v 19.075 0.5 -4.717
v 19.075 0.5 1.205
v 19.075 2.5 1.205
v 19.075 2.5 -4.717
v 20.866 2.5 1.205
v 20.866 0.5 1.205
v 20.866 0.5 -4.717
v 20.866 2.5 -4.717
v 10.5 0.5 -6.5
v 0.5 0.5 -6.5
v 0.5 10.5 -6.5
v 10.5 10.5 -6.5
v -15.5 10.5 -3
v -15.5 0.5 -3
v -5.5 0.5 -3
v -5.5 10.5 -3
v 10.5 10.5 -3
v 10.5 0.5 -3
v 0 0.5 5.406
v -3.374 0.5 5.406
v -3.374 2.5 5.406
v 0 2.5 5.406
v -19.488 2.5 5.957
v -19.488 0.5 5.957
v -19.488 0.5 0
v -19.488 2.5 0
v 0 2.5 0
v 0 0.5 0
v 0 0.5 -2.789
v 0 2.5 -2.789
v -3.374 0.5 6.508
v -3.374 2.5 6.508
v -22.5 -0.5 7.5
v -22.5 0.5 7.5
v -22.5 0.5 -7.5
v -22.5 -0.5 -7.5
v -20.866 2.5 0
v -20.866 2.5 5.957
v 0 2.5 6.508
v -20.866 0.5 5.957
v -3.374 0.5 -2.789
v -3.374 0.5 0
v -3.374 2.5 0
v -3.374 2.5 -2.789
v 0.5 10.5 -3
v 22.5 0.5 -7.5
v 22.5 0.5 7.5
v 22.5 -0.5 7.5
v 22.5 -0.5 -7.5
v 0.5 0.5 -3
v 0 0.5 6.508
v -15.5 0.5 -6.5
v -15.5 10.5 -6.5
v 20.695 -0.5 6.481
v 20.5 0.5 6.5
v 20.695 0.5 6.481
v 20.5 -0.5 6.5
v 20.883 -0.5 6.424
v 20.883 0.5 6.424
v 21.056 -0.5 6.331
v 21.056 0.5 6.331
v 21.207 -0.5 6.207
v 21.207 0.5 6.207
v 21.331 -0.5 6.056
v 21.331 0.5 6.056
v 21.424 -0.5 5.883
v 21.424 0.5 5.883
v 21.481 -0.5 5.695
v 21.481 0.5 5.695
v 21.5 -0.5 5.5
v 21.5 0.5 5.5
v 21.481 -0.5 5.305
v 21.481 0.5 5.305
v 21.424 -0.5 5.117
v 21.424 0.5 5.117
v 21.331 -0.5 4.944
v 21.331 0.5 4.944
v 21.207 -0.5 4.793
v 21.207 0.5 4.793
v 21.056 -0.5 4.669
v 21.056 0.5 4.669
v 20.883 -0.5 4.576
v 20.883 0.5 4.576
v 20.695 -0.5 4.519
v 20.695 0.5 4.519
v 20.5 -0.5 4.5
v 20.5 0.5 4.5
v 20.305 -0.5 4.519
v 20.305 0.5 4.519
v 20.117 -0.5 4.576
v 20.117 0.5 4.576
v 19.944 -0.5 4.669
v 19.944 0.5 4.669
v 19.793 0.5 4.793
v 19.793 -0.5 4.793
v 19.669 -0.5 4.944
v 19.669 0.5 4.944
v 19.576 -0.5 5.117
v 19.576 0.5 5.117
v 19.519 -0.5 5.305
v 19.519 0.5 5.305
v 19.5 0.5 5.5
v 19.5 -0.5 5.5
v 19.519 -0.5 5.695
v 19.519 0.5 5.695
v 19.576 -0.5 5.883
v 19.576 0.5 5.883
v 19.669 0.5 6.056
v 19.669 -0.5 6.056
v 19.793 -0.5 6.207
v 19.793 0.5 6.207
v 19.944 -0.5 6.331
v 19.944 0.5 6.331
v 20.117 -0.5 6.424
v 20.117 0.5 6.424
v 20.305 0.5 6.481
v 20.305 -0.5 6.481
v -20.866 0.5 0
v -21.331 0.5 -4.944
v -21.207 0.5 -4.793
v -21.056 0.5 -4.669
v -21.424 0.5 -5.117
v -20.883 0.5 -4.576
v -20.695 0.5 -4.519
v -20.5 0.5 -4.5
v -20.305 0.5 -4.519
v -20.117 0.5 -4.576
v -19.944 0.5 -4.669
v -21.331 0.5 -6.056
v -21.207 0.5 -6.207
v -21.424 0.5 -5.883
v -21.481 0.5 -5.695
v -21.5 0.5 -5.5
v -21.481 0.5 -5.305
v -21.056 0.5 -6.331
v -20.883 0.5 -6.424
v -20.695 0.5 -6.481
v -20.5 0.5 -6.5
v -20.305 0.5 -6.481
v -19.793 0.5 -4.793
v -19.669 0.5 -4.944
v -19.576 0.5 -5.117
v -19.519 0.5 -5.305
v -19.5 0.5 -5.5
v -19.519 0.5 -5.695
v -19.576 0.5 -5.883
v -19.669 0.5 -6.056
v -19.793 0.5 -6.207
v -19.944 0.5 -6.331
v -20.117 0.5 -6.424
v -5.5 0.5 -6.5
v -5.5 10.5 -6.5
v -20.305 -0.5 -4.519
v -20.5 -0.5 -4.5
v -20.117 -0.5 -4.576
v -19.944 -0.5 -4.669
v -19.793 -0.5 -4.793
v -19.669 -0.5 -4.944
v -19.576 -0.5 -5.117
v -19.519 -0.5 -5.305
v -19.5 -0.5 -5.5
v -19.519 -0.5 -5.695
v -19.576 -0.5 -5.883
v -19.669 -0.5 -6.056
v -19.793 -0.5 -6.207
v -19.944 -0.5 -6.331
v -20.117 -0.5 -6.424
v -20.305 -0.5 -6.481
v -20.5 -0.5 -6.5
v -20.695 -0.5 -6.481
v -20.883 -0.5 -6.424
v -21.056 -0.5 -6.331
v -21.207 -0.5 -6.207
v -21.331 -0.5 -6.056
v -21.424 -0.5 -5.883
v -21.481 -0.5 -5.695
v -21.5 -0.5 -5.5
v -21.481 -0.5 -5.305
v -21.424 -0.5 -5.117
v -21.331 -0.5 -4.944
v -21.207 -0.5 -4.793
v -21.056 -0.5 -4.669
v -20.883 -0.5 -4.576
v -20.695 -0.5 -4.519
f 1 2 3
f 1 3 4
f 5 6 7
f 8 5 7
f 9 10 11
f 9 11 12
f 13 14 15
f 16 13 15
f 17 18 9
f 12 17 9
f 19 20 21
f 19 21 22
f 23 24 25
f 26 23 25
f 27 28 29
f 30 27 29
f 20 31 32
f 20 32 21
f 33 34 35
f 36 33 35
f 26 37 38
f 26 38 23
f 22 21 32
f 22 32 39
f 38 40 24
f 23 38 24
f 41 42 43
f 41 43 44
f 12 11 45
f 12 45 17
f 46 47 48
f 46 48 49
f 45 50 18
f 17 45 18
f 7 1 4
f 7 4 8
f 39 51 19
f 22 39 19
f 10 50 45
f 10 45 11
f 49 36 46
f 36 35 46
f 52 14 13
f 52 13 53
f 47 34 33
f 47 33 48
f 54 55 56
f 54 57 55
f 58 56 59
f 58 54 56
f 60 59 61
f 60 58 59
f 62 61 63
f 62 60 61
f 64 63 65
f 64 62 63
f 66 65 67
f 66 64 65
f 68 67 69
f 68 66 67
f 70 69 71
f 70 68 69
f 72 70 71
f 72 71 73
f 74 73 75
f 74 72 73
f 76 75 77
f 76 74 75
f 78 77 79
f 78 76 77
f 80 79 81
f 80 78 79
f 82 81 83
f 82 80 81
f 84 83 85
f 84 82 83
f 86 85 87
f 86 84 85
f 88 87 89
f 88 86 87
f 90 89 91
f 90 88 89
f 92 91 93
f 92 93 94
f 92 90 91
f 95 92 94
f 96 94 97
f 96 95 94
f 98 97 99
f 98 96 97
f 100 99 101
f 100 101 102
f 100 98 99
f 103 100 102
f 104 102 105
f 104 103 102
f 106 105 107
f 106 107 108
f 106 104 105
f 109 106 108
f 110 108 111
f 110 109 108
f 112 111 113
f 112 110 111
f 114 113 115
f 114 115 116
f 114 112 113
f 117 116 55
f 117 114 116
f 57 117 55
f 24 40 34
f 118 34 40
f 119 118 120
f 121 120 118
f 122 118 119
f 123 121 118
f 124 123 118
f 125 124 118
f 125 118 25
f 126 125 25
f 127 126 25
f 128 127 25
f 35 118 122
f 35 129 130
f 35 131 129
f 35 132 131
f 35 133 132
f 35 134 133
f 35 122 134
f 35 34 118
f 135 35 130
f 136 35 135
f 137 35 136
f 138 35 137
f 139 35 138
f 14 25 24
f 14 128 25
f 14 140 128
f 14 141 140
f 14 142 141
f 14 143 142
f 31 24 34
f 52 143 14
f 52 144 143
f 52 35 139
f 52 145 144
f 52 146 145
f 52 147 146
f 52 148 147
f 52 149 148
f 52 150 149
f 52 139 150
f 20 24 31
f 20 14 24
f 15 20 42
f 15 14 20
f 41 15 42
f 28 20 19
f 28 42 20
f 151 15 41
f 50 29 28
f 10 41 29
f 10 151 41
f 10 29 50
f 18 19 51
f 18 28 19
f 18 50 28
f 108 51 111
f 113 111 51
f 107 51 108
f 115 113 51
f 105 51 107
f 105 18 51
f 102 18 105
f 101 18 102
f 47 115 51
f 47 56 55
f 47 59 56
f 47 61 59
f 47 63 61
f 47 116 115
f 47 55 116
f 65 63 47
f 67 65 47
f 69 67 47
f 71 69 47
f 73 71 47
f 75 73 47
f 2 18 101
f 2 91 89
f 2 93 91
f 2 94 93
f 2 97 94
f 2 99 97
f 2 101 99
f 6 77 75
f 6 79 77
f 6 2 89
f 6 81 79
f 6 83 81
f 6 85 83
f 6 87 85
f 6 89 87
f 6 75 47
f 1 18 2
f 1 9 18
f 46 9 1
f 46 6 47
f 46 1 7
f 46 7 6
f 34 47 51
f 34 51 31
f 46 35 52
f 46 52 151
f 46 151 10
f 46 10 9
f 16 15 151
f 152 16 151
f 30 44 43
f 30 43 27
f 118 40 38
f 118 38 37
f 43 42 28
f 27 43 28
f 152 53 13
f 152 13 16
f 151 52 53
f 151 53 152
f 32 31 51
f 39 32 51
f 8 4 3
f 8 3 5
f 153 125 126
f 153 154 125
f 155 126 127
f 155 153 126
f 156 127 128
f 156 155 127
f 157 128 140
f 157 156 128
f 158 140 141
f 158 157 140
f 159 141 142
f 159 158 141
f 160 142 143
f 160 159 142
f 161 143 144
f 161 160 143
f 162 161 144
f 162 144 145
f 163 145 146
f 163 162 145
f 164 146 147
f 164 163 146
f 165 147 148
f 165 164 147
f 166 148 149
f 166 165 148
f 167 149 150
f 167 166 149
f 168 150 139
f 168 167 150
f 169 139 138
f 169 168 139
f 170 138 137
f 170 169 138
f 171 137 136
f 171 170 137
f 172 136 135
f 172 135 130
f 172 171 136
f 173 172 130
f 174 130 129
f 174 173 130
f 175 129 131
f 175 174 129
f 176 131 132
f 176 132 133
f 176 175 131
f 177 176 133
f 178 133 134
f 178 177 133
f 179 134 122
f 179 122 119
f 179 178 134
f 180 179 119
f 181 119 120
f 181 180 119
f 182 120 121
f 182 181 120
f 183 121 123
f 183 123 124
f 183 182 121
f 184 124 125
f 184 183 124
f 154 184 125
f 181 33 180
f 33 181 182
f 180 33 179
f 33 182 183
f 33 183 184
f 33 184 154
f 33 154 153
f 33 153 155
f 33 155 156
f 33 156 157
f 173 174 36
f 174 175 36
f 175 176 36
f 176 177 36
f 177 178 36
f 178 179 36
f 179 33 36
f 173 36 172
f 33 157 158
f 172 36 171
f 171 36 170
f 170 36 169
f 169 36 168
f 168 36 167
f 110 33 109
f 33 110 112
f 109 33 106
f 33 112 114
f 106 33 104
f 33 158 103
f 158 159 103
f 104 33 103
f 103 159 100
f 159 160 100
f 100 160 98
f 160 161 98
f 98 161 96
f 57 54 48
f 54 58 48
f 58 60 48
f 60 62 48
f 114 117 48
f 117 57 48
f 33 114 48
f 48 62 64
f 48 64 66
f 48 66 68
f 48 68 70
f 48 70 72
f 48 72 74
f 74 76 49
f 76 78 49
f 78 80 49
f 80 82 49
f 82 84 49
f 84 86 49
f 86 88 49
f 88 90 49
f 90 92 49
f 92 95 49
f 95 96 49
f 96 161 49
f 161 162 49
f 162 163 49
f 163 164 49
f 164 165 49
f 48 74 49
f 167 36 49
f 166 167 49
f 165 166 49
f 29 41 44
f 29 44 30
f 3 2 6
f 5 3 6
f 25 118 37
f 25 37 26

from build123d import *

# Parameters (mm, degrees)
SKETCH1_W           = 45
SKETCH1_H           = 15
SKETCH1_R           = 1
BOSS_EXTRUDE1_DEPTH = 0.5
SKETCH2_W           = 10
SKETCH2_H           = 3.5
BOSS_EXTRUDE2_DEPTH = 10
SKETCH3_W           = 3.374290432
SKETCH3_H           = 2.788954337
SKETCH3_W_2         = 1.377261401
SKETCH3_H_2         = 5.956655559
SKETCH3_H_3         = 1.10180912
SKETCH3_W_3         = 1.790439821
SKETCH3_H_4         = 5.922224024
BOSS_EXTRUDE3_DEPTH = 2


with BuildPart() as part:
    # Sketch1 → Boss-Extrude1 (new, symmetric)
    with BuildSketch(Plane(origin=(0, 0, 0), x_dir=(1, 0, 0), z_dir=(0, 1, 0))):
        Rectangle(SKETCH1_W, SKETCH1_H)
        with Locations(Location((-20.5, 5.5, 0), (0, 0, 270))):
            Circle(SKETCH1_R, mode=Mode.SUBTRACT)
        with Locations(Location((20.5, -5.5, 0), (0, 0, 270))):
            Circle(SKETCH1_R, mode=Mode.SUBTRACT)
    extrude(amount=BOSS_EXTRUDE1_DEPTH, both=True)

    # Sketch2 → Boss-Extrude2 (add)
    with BuildSketch(Plane(origin=(0, 0.5, 0), x_dir=(1, 0, 0), z_dir=(0, 1, 0))):
        with Locations((-10.5, 4.75)):
            Rectangle(SKETCH2_W, SKETCH2_H)
        with Locations((5.5, 4.75)):
            Rectangle(SKETCH2_W, SKETCH2_H)
    extrude(amount=BOSS_EXTRUDE2_DEPTH)

    # Sketch3 → Boss-Extrude3 (add)
    with BuildSketch(Plane(origin=(0, 0.5, 0), x_dir=(1, 0, 0), z_dir=(0, 1, 0))):
        with Locations((-1.687145216, 1.394477169)):
            Rectangle(SKETCH3_W, SKETCH3_H)
        with Locations((-20.176879524, -2.97832778)):
            Rectangle(SKETCH3_W_2, SKETCH3_H_2)
        with Locations((-1.687145216, -5.956655559)):
            Rectangle(SKETCH3_W, SKETCH3_H_3)
        with Locations((19.970290314, 1.756008286)):
            Rectangle(SKETCH3_W_3, SKETCH3_H_4)
    extrude(amount=BOSS_EXTRUDE3_DEPTH)


solid = part.part
